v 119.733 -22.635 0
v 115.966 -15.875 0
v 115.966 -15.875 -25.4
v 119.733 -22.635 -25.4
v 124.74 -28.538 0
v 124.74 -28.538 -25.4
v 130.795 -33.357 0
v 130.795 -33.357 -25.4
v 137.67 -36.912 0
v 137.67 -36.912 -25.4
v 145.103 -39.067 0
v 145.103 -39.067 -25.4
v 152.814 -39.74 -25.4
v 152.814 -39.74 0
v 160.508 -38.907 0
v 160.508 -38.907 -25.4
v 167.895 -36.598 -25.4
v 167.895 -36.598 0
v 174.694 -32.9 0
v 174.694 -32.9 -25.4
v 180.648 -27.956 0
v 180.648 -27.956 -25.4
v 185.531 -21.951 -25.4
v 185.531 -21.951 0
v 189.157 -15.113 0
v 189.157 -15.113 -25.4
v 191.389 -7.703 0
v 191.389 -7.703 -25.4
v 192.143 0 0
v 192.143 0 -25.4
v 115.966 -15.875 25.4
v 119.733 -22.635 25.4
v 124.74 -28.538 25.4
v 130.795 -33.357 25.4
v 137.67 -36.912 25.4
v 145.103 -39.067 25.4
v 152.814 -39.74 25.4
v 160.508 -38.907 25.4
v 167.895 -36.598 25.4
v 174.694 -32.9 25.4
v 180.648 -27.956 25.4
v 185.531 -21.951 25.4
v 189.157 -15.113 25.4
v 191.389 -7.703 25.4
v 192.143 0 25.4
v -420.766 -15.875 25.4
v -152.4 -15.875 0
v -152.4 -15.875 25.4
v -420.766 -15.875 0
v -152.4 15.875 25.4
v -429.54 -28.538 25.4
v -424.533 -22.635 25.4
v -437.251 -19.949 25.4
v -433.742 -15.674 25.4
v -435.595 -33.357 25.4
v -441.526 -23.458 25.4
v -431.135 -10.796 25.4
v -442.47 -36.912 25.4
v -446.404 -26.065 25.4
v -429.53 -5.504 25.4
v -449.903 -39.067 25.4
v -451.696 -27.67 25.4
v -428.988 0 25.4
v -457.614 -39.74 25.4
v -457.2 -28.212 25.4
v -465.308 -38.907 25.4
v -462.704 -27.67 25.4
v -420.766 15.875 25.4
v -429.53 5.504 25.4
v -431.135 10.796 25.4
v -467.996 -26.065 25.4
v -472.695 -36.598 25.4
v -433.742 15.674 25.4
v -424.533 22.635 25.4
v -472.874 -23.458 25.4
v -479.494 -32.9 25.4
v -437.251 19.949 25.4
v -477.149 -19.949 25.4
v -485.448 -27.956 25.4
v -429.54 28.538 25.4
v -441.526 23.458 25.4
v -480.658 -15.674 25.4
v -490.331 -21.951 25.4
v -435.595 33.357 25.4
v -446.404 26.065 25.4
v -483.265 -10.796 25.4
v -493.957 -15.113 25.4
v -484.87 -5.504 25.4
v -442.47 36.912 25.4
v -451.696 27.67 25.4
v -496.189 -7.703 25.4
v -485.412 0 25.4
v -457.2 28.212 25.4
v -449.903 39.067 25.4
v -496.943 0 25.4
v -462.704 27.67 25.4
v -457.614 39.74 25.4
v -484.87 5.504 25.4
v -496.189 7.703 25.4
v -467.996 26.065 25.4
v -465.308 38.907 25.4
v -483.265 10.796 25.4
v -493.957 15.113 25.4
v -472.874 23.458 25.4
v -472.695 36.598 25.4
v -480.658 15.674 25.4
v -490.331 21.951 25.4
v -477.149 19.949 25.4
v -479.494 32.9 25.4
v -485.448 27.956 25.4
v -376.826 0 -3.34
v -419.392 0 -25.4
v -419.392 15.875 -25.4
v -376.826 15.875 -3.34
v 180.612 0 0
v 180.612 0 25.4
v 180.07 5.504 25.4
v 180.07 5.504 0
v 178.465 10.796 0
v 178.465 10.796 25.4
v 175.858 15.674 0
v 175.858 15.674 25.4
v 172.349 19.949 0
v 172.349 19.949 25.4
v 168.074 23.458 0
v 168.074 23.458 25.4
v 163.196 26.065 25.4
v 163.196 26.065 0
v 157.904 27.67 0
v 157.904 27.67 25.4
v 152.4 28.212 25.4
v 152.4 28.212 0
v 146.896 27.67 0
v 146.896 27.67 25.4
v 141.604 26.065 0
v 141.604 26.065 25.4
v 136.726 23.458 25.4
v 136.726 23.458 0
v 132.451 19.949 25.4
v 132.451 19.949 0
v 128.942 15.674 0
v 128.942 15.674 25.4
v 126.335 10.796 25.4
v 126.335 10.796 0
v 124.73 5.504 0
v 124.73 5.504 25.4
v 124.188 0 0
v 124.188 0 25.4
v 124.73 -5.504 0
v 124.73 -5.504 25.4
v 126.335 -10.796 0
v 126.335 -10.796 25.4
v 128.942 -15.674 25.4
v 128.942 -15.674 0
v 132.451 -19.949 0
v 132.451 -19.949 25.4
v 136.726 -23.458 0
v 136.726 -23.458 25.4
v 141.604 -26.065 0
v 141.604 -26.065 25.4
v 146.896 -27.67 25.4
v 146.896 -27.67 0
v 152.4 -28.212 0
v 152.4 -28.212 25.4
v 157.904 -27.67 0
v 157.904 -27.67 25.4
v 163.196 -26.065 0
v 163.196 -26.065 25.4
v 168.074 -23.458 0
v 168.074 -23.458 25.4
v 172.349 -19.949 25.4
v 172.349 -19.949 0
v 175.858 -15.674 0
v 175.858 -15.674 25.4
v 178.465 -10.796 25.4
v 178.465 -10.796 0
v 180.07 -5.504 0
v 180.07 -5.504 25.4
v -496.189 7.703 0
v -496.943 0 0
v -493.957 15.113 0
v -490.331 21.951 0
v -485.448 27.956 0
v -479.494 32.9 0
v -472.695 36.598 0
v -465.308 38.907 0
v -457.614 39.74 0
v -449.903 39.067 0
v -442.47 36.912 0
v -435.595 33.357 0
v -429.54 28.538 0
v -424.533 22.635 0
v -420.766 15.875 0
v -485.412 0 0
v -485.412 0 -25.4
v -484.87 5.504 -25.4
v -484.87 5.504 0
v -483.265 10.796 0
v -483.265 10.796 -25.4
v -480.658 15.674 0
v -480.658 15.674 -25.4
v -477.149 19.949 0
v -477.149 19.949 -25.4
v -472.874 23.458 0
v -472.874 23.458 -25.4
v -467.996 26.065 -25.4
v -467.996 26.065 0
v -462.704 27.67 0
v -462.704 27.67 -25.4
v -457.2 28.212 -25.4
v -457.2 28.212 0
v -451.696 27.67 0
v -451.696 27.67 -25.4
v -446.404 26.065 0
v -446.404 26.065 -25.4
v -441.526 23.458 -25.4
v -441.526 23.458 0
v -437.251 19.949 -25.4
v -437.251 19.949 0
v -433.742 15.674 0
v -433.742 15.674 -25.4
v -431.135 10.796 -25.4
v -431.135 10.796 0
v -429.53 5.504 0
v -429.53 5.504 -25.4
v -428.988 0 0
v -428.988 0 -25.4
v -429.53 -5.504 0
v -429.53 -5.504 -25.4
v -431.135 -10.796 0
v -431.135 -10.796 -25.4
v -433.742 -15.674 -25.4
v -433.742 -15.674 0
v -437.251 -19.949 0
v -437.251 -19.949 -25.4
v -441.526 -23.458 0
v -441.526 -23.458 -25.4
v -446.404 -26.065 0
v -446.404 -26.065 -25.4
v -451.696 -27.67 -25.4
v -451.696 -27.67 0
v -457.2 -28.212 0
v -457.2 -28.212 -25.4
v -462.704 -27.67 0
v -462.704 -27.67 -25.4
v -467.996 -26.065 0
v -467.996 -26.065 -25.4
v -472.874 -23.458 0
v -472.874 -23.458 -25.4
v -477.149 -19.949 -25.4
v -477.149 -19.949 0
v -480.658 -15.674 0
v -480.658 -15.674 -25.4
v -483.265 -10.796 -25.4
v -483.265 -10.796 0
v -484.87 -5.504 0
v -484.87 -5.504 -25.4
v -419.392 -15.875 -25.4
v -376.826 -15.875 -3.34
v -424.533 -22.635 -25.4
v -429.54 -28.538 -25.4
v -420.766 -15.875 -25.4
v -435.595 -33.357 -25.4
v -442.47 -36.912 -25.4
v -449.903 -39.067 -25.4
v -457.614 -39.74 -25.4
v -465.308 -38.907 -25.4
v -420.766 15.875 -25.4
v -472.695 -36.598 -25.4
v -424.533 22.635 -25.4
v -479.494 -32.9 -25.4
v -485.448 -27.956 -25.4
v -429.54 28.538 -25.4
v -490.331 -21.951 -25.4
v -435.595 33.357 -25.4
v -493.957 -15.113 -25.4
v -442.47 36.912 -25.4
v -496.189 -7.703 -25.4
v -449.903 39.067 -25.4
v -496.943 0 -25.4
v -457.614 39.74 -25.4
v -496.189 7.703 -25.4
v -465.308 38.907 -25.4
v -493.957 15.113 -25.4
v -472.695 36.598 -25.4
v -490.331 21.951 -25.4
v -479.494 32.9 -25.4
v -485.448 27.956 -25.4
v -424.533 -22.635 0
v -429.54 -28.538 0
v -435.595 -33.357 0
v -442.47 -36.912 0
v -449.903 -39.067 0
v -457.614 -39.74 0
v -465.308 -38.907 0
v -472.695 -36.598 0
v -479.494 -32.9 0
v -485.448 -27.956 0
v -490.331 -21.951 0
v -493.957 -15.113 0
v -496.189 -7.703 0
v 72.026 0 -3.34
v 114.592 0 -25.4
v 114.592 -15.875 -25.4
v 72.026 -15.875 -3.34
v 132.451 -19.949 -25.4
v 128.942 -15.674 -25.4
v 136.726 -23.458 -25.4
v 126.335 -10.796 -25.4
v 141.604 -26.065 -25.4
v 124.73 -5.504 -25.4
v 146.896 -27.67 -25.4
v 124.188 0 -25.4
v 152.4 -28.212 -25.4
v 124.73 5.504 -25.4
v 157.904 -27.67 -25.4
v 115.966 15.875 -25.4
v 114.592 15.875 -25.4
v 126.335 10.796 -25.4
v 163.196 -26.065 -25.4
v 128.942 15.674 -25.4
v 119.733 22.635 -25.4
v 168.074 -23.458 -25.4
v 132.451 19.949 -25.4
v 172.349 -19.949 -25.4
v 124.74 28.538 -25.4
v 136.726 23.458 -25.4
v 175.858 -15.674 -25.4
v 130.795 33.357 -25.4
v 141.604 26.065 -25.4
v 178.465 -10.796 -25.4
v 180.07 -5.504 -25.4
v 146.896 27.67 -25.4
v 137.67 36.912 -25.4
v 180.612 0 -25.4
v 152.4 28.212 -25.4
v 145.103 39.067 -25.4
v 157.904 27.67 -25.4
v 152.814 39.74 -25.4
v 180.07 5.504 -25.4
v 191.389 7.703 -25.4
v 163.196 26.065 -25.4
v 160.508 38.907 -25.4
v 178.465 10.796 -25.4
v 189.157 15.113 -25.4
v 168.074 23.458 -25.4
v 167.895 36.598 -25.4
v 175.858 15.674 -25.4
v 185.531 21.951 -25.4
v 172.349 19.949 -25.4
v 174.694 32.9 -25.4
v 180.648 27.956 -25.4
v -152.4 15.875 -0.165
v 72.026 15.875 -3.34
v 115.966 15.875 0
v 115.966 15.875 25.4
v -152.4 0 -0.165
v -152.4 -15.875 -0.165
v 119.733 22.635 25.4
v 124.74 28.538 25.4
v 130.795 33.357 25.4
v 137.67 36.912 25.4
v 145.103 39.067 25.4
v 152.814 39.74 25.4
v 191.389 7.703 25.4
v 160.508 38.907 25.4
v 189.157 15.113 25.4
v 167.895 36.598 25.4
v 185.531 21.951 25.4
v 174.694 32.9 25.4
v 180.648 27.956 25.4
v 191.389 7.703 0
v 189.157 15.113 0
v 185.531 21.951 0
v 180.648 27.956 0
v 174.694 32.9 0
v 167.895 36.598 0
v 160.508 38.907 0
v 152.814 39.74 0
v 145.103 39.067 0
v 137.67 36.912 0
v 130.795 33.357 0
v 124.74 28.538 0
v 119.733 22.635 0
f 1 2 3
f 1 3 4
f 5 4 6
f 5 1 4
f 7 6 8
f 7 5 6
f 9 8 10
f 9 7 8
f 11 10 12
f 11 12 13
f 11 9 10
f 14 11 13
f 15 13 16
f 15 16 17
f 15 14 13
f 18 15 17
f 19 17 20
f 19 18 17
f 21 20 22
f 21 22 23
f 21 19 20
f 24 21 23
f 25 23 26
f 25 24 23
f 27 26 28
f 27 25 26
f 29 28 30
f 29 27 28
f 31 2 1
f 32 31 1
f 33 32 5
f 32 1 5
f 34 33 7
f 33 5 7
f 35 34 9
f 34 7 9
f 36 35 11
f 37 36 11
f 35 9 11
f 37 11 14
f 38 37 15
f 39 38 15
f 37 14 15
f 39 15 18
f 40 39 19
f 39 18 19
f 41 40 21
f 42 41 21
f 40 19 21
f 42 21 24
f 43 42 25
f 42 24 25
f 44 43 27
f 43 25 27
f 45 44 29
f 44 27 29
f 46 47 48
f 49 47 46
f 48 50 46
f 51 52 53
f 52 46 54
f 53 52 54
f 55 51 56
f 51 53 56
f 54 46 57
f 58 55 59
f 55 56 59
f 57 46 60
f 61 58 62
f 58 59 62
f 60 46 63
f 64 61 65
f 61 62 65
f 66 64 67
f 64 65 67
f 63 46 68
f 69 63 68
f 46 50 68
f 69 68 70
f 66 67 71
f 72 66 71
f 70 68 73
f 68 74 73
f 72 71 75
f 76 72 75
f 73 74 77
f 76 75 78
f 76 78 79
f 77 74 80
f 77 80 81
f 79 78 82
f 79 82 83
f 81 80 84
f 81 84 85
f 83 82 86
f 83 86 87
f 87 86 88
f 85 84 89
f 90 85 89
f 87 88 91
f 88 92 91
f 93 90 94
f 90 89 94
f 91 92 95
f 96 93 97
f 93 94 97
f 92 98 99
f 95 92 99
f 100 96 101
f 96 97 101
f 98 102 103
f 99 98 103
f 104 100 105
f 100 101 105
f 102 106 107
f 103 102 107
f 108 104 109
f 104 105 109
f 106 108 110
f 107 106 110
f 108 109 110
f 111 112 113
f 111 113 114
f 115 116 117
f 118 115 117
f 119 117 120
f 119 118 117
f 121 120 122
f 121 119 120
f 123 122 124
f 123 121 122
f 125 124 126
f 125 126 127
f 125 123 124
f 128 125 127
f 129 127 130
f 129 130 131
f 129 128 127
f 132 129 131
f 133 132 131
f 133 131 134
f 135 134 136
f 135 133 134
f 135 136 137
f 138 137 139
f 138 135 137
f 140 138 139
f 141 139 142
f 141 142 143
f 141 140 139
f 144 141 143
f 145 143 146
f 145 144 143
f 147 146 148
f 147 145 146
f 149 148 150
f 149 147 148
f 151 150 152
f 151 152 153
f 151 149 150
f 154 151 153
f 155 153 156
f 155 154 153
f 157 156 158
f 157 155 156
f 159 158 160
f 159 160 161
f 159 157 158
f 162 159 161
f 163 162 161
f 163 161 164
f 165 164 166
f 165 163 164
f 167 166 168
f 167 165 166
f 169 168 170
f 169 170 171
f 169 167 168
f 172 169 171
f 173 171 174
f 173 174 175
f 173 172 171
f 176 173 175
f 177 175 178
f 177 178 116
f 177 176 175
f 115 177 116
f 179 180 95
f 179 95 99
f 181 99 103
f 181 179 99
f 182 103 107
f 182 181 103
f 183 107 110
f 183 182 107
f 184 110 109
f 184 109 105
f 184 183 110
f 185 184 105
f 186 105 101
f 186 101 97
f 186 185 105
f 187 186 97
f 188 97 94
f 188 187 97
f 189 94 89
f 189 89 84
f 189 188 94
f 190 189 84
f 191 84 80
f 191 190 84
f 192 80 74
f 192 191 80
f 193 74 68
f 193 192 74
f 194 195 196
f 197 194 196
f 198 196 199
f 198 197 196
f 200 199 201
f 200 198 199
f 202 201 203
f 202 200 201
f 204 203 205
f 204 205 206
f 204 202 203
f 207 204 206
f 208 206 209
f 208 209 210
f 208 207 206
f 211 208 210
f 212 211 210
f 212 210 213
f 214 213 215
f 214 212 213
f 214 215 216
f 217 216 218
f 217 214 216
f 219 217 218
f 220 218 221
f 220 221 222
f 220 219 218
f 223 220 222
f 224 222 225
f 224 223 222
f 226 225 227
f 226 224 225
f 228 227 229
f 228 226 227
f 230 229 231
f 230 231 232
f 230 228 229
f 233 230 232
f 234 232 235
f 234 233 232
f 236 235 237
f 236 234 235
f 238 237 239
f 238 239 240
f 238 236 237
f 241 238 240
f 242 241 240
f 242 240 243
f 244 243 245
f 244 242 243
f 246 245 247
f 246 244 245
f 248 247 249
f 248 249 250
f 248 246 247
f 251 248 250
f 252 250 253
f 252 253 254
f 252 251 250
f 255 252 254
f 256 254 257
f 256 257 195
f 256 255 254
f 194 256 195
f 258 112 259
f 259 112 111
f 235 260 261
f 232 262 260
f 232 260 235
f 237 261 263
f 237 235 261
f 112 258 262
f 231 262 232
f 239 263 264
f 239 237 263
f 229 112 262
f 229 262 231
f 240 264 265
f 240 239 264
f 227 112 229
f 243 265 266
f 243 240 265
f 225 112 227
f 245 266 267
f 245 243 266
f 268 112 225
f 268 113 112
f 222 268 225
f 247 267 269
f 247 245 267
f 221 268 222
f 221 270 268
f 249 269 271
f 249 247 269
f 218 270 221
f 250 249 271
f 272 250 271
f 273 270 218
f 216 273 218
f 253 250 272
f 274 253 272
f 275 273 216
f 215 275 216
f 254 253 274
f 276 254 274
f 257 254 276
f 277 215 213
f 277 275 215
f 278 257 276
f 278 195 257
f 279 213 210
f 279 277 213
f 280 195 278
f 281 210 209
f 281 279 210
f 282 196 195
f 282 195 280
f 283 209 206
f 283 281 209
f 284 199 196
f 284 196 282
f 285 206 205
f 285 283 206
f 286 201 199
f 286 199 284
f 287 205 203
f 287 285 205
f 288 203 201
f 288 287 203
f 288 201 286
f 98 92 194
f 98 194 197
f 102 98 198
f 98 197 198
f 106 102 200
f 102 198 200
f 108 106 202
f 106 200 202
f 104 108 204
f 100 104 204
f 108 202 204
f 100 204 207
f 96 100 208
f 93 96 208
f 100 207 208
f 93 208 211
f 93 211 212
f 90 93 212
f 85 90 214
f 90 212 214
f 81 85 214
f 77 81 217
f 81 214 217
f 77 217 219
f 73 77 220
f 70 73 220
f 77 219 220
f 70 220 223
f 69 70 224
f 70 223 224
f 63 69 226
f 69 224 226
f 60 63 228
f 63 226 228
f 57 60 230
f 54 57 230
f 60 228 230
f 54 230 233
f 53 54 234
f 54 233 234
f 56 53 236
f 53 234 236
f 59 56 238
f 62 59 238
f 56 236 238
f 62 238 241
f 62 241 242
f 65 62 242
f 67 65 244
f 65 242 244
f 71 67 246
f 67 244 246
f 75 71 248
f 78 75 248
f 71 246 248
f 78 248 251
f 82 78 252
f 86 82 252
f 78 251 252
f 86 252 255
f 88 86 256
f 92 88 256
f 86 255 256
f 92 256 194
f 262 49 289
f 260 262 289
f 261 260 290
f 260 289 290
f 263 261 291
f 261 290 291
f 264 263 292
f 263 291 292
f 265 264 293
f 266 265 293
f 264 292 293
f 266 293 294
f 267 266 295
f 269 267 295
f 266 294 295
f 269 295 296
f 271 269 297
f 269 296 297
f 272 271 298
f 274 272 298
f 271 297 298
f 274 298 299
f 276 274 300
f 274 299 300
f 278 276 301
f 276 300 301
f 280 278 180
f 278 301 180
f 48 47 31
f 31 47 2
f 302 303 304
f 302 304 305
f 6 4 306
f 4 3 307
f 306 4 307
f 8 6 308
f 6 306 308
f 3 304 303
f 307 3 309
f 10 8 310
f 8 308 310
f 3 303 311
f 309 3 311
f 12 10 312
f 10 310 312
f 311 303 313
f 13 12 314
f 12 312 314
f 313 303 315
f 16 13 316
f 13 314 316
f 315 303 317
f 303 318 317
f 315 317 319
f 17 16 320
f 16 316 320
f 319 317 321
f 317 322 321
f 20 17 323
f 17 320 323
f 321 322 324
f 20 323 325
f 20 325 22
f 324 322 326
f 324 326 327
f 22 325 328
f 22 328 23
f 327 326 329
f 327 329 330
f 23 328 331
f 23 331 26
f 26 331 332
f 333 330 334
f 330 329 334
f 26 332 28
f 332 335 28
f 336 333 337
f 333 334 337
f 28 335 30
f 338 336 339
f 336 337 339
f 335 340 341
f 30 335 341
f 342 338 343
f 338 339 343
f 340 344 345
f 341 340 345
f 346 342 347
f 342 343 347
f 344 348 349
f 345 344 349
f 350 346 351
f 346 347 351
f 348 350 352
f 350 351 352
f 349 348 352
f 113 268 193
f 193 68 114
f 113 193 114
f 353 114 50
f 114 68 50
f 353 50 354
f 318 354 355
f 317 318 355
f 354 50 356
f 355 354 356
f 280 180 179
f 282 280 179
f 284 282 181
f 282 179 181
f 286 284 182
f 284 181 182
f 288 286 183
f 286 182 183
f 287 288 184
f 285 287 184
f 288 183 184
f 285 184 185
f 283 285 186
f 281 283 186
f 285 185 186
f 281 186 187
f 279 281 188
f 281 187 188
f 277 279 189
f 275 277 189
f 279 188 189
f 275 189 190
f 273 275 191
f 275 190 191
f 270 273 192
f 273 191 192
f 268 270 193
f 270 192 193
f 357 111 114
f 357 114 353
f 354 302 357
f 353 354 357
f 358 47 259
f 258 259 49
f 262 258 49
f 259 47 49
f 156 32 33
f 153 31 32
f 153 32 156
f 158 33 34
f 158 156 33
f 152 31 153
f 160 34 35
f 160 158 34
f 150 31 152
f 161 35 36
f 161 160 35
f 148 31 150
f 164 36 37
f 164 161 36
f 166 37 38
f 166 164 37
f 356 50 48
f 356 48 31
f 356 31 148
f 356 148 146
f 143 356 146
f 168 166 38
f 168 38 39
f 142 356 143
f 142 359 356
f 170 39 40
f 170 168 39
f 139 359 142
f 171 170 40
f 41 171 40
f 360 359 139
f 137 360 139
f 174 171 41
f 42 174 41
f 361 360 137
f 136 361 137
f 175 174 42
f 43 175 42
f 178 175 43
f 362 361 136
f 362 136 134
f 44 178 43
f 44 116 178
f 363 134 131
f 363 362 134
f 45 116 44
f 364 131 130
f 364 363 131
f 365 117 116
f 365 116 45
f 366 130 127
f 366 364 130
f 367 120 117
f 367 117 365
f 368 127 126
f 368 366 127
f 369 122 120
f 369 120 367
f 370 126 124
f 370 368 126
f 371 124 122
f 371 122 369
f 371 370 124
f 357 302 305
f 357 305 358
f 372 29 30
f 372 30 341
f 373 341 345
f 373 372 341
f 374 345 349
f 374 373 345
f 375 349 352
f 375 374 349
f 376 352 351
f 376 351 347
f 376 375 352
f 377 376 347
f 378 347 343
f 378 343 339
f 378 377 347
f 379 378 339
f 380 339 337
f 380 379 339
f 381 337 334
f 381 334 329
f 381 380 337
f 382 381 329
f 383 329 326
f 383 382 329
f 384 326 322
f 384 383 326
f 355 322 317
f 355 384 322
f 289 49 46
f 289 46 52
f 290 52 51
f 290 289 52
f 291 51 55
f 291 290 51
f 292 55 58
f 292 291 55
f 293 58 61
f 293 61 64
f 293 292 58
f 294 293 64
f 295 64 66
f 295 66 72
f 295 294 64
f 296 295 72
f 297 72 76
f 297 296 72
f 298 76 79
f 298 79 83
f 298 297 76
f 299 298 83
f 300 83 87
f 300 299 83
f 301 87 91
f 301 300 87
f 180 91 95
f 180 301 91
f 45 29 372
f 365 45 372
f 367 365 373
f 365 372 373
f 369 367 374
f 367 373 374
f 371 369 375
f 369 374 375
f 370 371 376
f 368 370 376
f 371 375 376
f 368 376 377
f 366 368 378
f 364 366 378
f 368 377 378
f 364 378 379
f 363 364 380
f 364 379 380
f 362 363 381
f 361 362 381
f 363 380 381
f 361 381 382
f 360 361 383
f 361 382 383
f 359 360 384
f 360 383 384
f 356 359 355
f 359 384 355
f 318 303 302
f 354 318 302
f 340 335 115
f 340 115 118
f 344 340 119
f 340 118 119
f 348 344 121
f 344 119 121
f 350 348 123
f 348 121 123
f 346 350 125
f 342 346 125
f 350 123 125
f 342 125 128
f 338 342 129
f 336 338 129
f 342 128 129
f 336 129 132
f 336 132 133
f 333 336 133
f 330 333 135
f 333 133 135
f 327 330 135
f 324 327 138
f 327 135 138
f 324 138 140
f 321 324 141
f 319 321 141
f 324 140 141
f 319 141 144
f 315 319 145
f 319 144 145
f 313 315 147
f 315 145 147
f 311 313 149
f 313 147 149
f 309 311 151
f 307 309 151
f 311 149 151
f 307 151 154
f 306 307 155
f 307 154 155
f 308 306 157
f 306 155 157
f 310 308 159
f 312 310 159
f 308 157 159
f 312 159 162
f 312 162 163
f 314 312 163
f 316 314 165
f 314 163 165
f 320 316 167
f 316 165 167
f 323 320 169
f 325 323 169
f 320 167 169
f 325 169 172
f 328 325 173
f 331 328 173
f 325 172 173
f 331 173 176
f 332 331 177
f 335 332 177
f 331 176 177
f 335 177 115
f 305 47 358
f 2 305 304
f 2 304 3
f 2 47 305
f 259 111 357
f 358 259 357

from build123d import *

# Parameters (mm, degrees)
F0_R          = 28.2124188792
F1_DEPTH      = 25.4
F1_DEPTH_BACK = 25.4
F3_DEPTH      = 67.69626
F3_DEPTH_BACK = 44.95286


with BuildPart() as f1:
    # F0 (on Top) → F1 (new body, two sides)
    with BuildSketch(Plane.XY) as f1_sk:
        with BuildLine():
            ThreePointArc((115.9656523028, -15.875), (112.6573614726, 0), (115.9656523028, 15.875))
            Line((115.9656523028, 15.875), (-152.4, 15.875))
            Line((-152.4, 15.875), (-152.4, -15.875))
            Line((-152.4, -15.875), (115.9656523028, -15.875))
        make_face()
        with BuildLine():
            ThreePointArc((192.1426385274, 0), (160.5080270907, 38.906775937), (115.9656523028, 15.875))
            ThreePointArc((115.9656523028, 15.875), (112.6573614726, 0), (115.9656523028, -15.875))
            ThreePointArc((115.9656523028, -15.875), (160.5080270907, -38.906775937), (192.1426385274, 0))
        make_face()
        with Locations((152.4, 0)):
            Circle(F0_R, mode=Mode.SUBTRACT)
    extrude(amount=F1_DEPTH)
    extrude(f1_sk.sketch, amount=-F1_DEPTH_BACK)

    # F2 (on Front) → F3 (cut, two sides)
    with BuildSketch(Plane.XZ) as f3_sk:
        Polygon((72.0261707902, -3.3403777052), (-164.0271991491, 0), (-162.436529994, -48.5150068998), (115.6101450324, -51.6963265836), (115.6101450324, -25.9276945144), align=None)
    extrude(amount=-F3_DEPTH, mode=Mode.SUBTRACT)
    extrude(f3_sk.sketch, amount=F3_DEPTH_BACK, mode=Mode.SUBTRACT)

    # F4: F1 across face


with BuildPart() as f1_1:
    add(f1.part)
    add(f1.part.mirror(Plane(origin=(-152.4, 0, 12.6177320857), x_dir=(0, -1, 0), z_dir=(-1, 0, 0))))


solid = f1_1.part
